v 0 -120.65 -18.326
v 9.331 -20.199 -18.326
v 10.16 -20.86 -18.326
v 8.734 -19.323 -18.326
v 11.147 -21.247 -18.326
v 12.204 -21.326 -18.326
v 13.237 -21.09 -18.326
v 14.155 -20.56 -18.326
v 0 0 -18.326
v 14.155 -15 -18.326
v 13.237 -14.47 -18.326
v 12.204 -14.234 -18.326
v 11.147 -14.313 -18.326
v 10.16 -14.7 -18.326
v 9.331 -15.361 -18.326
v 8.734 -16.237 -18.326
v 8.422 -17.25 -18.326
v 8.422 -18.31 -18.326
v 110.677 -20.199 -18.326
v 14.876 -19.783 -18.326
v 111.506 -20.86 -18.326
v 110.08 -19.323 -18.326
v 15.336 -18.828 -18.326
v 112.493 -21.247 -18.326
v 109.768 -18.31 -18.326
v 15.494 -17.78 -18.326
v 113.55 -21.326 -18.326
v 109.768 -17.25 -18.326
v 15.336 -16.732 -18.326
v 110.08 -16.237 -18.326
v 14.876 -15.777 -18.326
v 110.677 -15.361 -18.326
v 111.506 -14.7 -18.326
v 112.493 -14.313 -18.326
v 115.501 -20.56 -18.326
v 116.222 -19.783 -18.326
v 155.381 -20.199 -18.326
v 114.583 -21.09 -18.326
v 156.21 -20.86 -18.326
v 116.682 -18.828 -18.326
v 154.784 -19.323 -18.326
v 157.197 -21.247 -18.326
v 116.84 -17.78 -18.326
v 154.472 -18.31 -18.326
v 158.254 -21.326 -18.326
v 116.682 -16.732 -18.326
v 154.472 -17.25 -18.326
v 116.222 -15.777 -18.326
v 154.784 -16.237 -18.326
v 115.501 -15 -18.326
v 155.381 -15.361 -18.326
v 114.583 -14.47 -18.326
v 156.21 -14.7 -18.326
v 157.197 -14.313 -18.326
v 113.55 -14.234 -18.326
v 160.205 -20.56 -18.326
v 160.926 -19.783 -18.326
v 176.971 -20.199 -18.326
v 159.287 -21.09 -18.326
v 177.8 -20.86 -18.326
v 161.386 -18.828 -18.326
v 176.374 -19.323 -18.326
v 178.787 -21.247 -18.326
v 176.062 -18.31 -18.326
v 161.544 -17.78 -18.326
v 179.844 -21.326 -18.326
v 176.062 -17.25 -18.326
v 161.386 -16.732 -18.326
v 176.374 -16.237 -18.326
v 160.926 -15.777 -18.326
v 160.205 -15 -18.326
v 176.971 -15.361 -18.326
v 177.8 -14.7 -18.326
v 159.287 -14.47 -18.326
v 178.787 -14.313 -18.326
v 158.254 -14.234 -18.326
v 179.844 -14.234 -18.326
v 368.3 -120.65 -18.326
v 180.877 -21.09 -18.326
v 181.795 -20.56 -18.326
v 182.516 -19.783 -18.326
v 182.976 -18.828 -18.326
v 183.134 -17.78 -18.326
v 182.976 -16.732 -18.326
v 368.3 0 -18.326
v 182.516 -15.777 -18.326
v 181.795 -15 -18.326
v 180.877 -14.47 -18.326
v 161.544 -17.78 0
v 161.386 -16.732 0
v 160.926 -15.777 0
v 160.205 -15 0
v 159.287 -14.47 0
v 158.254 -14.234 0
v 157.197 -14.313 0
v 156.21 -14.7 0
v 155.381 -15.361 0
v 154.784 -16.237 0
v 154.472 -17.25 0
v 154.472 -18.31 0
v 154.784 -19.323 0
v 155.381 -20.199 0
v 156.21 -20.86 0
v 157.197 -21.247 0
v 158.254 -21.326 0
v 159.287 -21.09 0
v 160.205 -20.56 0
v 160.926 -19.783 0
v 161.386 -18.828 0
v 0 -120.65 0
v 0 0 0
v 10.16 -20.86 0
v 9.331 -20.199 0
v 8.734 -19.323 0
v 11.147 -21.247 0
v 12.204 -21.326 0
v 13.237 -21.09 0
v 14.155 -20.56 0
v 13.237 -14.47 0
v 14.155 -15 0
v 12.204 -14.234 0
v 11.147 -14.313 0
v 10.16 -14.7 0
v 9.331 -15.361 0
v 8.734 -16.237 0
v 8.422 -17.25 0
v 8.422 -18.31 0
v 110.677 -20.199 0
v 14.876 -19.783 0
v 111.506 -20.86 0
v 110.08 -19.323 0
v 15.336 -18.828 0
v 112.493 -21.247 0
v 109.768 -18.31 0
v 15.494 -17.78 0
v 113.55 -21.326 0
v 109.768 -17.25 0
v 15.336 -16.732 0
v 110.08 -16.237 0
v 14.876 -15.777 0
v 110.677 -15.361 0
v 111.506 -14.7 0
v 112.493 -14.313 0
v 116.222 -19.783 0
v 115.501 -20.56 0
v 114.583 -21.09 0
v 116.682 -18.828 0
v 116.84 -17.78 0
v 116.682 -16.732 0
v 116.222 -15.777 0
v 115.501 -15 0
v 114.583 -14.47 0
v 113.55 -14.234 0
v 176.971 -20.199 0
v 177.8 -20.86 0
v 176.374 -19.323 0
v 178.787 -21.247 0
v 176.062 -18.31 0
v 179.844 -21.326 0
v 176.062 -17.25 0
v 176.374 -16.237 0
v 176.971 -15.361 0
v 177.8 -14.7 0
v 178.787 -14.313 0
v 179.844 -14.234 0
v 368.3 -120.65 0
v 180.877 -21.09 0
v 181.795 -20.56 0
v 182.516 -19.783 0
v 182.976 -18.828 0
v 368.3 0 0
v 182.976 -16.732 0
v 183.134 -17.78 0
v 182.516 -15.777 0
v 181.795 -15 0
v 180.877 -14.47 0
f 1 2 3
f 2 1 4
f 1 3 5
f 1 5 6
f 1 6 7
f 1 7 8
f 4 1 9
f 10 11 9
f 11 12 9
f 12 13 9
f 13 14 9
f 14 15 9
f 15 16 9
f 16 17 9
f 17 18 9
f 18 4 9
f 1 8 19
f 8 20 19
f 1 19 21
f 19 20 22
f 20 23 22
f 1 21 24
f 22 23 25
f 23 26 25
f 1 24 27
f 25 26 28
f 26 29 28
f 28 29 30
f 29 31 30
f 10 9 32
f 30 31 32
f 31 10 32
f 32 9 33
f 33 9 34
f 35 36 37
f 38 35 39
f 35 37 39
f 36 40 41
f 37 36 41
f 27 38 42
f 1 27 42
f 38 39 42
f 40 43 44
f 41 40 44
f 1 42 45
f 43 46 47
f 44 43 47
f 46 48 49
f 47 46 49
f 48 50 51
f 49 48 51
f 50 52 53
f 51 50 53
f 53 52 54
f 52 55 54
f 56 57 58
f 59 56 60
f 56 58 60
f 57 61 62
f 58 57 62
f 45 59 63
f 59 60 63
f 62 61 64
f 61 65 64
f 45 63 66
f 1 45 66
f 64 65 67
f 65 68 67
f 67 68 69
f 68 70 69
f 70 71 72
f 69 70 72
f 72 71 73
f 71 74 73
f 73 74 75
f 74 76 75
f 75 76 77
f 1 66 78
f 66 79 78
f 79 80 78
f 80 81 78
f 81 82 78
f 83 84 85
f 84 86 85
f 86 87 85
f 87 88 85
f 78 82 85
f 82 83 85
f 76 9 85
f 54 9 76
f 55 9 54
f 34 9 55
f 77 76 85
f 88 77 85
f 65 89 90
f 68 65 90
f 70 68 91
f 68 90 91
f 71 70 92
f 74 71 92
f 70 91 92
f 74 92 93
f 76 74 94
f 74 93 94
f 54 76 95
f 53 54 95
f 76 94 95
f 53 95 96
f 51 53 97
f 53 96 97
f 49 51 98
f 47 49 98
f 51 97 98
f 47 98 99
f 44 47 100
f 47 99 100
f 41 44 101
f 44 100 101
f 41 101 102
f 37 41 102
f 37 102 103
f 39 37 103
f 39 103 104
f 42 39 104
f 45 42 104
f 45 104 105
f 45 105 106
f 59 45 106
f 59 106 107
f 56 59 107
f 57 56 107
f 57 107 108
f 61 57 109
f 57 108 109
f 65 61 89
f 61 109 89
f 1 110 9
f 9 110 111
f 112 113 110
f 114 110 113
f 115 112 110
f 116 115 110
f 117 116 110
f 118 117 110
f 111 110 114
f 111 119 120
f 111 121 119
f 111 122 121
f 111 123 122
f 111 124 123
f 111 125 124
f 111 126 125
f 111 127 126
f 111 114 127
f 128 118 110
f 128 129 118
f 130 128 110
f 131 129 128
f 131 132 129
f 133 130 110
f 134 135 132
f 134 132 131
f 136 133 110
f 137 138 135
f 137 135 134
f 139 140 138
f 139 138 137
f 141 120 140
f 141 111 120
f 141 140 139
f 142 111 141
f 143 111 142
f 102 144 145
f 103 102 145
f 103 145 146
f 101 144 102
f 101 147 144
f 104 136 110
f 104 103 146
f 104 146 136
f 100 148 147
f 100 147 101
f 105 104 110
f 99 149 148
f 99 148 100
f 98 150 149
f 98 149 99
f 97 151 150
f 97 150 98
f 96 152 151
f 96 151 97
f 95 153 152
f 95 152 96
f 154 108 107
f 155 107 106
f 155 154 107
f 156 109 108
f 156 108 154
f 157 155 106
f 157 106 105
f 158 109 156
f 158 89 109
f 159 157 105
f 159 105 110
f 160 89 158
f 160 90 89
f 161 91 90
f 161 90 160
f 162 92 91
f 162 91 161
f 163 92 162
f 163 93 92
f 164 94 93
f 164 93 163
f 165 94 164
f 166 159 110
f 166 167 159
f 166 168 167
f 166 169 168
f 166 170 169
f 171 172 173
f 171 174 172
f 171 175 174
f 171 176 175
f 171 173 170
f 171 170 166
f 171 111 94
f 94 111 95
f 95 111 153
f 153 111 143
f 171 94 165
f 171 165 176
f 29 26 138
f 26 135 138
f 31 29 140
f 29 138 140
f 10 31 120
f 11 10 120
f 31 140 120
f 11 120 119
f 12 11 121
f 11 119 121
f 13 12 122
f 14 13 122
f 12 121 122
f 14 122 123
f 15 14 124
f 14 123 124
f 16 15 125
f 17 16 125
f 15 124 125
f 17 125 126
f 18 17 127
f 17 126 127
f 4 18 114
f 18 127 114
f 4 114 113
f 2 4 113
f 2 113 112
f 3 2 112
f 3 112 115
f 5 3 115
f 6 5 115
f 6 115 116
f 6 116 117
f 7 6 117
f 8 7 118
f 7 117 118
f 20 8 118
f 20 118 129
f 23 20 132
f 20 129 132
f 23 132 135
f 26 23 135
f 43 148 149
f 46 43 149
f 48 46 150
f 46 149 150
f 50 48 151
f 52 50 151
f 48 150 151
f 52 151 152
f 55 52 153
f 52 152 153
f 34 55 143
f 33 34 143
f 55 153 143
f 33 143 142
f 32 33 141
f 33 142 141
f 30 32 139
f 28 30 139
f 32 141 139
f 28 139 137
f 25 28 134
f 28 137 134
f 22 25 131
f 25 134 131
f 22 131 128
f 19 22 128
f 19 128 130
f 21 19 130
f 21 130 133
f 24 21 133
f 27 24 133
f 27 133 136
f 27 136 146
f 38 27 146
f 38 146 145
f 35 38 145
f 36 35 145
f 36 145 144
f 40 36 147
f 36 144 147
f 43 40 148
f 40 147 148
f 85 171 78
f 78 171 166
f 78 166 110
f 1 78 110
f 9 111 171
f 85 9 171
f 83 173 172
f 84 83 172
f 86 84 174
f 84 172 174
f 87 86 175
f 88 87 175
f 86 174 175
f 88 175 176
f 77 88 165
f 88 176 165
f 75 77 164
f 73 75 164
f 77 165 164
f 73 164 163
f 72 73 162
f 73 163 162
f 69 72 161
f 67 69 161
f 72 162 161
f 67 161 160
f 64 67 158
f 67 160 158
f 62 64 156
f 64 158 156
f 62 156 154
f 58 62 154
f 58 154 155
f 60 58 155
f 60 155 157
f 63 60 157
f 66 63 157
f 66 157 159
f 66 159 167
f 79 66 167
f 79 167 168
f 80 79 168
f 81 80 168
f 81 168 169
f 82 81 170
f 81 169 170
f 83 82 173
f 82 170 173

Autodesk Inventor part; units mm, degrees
ref_plane "YZ Plane" through (0, 0, 0) normal (1, 0, 0) x (0, 1, 0)
ref_plane "XZ Plane" through (0, 0, 0) normal (0, 1, 0) x (-1, 0, 0)
ref_plane "XY Plane" through (0, 0, 0) normal (0, 0, 1) x (1, 0, 0)
sketch "Sketch1" plane through (0, 0, 0) normal (0, 0, 1) x (1, 0, 0)
  point P0 (0, 0)
sketch "Sketch2" plane through (0, 0, 0) normal (0, 0, 1) x (1, 0, 0)
  line L0 (0, 0) -> (368.3, 0)
  line L1 (368.3, 0) -> (368.3, -120.65)
  line L2 (368.3, -120.65) -> (0, -120.65)
  line L3 (0, -120.65) -> (0, 0)
  circle A0 centre (11.938, -17.78) radius 3.556
  circle A1 centre (113.284, -17.78) radius 3.556
  circle A2 centre (157.988, -17.78) radius 3.556
  circle A3 centre (179.578, -17.78) radius 3.556
  dimension "d1" = 368.3
  dimension "d2" = 120.65
  dimension "d3" = 7.112
  dimension "d4" = 11.938
  dimension "d5" = 102.87
  dimension "d6" = 7.112
  dimension "d8" = 101.346
  dimension "d9" = 7.112
  dimension "d10" = 102.87
  dimension "d11" = 44.704
  dimension "d12" = 7.112
  dimension "d13" = 102.87
  dimension "d14" = 21.59
extrude "Extrusion1" add sketch "Sketch2" against normal blind 18.3261
sketch "Sketch3" plane through (0, 0, 0) normal (0, 0, 1) x (1, 0, 0)
  line L0 (368.3, -120.65) -> (0, -120.65) projected
  line L1 (0, 0) -> (368.3, 0) projected
  dimension "d17" = 120.65
properties part number "kermit bumper (Medium 4)"
